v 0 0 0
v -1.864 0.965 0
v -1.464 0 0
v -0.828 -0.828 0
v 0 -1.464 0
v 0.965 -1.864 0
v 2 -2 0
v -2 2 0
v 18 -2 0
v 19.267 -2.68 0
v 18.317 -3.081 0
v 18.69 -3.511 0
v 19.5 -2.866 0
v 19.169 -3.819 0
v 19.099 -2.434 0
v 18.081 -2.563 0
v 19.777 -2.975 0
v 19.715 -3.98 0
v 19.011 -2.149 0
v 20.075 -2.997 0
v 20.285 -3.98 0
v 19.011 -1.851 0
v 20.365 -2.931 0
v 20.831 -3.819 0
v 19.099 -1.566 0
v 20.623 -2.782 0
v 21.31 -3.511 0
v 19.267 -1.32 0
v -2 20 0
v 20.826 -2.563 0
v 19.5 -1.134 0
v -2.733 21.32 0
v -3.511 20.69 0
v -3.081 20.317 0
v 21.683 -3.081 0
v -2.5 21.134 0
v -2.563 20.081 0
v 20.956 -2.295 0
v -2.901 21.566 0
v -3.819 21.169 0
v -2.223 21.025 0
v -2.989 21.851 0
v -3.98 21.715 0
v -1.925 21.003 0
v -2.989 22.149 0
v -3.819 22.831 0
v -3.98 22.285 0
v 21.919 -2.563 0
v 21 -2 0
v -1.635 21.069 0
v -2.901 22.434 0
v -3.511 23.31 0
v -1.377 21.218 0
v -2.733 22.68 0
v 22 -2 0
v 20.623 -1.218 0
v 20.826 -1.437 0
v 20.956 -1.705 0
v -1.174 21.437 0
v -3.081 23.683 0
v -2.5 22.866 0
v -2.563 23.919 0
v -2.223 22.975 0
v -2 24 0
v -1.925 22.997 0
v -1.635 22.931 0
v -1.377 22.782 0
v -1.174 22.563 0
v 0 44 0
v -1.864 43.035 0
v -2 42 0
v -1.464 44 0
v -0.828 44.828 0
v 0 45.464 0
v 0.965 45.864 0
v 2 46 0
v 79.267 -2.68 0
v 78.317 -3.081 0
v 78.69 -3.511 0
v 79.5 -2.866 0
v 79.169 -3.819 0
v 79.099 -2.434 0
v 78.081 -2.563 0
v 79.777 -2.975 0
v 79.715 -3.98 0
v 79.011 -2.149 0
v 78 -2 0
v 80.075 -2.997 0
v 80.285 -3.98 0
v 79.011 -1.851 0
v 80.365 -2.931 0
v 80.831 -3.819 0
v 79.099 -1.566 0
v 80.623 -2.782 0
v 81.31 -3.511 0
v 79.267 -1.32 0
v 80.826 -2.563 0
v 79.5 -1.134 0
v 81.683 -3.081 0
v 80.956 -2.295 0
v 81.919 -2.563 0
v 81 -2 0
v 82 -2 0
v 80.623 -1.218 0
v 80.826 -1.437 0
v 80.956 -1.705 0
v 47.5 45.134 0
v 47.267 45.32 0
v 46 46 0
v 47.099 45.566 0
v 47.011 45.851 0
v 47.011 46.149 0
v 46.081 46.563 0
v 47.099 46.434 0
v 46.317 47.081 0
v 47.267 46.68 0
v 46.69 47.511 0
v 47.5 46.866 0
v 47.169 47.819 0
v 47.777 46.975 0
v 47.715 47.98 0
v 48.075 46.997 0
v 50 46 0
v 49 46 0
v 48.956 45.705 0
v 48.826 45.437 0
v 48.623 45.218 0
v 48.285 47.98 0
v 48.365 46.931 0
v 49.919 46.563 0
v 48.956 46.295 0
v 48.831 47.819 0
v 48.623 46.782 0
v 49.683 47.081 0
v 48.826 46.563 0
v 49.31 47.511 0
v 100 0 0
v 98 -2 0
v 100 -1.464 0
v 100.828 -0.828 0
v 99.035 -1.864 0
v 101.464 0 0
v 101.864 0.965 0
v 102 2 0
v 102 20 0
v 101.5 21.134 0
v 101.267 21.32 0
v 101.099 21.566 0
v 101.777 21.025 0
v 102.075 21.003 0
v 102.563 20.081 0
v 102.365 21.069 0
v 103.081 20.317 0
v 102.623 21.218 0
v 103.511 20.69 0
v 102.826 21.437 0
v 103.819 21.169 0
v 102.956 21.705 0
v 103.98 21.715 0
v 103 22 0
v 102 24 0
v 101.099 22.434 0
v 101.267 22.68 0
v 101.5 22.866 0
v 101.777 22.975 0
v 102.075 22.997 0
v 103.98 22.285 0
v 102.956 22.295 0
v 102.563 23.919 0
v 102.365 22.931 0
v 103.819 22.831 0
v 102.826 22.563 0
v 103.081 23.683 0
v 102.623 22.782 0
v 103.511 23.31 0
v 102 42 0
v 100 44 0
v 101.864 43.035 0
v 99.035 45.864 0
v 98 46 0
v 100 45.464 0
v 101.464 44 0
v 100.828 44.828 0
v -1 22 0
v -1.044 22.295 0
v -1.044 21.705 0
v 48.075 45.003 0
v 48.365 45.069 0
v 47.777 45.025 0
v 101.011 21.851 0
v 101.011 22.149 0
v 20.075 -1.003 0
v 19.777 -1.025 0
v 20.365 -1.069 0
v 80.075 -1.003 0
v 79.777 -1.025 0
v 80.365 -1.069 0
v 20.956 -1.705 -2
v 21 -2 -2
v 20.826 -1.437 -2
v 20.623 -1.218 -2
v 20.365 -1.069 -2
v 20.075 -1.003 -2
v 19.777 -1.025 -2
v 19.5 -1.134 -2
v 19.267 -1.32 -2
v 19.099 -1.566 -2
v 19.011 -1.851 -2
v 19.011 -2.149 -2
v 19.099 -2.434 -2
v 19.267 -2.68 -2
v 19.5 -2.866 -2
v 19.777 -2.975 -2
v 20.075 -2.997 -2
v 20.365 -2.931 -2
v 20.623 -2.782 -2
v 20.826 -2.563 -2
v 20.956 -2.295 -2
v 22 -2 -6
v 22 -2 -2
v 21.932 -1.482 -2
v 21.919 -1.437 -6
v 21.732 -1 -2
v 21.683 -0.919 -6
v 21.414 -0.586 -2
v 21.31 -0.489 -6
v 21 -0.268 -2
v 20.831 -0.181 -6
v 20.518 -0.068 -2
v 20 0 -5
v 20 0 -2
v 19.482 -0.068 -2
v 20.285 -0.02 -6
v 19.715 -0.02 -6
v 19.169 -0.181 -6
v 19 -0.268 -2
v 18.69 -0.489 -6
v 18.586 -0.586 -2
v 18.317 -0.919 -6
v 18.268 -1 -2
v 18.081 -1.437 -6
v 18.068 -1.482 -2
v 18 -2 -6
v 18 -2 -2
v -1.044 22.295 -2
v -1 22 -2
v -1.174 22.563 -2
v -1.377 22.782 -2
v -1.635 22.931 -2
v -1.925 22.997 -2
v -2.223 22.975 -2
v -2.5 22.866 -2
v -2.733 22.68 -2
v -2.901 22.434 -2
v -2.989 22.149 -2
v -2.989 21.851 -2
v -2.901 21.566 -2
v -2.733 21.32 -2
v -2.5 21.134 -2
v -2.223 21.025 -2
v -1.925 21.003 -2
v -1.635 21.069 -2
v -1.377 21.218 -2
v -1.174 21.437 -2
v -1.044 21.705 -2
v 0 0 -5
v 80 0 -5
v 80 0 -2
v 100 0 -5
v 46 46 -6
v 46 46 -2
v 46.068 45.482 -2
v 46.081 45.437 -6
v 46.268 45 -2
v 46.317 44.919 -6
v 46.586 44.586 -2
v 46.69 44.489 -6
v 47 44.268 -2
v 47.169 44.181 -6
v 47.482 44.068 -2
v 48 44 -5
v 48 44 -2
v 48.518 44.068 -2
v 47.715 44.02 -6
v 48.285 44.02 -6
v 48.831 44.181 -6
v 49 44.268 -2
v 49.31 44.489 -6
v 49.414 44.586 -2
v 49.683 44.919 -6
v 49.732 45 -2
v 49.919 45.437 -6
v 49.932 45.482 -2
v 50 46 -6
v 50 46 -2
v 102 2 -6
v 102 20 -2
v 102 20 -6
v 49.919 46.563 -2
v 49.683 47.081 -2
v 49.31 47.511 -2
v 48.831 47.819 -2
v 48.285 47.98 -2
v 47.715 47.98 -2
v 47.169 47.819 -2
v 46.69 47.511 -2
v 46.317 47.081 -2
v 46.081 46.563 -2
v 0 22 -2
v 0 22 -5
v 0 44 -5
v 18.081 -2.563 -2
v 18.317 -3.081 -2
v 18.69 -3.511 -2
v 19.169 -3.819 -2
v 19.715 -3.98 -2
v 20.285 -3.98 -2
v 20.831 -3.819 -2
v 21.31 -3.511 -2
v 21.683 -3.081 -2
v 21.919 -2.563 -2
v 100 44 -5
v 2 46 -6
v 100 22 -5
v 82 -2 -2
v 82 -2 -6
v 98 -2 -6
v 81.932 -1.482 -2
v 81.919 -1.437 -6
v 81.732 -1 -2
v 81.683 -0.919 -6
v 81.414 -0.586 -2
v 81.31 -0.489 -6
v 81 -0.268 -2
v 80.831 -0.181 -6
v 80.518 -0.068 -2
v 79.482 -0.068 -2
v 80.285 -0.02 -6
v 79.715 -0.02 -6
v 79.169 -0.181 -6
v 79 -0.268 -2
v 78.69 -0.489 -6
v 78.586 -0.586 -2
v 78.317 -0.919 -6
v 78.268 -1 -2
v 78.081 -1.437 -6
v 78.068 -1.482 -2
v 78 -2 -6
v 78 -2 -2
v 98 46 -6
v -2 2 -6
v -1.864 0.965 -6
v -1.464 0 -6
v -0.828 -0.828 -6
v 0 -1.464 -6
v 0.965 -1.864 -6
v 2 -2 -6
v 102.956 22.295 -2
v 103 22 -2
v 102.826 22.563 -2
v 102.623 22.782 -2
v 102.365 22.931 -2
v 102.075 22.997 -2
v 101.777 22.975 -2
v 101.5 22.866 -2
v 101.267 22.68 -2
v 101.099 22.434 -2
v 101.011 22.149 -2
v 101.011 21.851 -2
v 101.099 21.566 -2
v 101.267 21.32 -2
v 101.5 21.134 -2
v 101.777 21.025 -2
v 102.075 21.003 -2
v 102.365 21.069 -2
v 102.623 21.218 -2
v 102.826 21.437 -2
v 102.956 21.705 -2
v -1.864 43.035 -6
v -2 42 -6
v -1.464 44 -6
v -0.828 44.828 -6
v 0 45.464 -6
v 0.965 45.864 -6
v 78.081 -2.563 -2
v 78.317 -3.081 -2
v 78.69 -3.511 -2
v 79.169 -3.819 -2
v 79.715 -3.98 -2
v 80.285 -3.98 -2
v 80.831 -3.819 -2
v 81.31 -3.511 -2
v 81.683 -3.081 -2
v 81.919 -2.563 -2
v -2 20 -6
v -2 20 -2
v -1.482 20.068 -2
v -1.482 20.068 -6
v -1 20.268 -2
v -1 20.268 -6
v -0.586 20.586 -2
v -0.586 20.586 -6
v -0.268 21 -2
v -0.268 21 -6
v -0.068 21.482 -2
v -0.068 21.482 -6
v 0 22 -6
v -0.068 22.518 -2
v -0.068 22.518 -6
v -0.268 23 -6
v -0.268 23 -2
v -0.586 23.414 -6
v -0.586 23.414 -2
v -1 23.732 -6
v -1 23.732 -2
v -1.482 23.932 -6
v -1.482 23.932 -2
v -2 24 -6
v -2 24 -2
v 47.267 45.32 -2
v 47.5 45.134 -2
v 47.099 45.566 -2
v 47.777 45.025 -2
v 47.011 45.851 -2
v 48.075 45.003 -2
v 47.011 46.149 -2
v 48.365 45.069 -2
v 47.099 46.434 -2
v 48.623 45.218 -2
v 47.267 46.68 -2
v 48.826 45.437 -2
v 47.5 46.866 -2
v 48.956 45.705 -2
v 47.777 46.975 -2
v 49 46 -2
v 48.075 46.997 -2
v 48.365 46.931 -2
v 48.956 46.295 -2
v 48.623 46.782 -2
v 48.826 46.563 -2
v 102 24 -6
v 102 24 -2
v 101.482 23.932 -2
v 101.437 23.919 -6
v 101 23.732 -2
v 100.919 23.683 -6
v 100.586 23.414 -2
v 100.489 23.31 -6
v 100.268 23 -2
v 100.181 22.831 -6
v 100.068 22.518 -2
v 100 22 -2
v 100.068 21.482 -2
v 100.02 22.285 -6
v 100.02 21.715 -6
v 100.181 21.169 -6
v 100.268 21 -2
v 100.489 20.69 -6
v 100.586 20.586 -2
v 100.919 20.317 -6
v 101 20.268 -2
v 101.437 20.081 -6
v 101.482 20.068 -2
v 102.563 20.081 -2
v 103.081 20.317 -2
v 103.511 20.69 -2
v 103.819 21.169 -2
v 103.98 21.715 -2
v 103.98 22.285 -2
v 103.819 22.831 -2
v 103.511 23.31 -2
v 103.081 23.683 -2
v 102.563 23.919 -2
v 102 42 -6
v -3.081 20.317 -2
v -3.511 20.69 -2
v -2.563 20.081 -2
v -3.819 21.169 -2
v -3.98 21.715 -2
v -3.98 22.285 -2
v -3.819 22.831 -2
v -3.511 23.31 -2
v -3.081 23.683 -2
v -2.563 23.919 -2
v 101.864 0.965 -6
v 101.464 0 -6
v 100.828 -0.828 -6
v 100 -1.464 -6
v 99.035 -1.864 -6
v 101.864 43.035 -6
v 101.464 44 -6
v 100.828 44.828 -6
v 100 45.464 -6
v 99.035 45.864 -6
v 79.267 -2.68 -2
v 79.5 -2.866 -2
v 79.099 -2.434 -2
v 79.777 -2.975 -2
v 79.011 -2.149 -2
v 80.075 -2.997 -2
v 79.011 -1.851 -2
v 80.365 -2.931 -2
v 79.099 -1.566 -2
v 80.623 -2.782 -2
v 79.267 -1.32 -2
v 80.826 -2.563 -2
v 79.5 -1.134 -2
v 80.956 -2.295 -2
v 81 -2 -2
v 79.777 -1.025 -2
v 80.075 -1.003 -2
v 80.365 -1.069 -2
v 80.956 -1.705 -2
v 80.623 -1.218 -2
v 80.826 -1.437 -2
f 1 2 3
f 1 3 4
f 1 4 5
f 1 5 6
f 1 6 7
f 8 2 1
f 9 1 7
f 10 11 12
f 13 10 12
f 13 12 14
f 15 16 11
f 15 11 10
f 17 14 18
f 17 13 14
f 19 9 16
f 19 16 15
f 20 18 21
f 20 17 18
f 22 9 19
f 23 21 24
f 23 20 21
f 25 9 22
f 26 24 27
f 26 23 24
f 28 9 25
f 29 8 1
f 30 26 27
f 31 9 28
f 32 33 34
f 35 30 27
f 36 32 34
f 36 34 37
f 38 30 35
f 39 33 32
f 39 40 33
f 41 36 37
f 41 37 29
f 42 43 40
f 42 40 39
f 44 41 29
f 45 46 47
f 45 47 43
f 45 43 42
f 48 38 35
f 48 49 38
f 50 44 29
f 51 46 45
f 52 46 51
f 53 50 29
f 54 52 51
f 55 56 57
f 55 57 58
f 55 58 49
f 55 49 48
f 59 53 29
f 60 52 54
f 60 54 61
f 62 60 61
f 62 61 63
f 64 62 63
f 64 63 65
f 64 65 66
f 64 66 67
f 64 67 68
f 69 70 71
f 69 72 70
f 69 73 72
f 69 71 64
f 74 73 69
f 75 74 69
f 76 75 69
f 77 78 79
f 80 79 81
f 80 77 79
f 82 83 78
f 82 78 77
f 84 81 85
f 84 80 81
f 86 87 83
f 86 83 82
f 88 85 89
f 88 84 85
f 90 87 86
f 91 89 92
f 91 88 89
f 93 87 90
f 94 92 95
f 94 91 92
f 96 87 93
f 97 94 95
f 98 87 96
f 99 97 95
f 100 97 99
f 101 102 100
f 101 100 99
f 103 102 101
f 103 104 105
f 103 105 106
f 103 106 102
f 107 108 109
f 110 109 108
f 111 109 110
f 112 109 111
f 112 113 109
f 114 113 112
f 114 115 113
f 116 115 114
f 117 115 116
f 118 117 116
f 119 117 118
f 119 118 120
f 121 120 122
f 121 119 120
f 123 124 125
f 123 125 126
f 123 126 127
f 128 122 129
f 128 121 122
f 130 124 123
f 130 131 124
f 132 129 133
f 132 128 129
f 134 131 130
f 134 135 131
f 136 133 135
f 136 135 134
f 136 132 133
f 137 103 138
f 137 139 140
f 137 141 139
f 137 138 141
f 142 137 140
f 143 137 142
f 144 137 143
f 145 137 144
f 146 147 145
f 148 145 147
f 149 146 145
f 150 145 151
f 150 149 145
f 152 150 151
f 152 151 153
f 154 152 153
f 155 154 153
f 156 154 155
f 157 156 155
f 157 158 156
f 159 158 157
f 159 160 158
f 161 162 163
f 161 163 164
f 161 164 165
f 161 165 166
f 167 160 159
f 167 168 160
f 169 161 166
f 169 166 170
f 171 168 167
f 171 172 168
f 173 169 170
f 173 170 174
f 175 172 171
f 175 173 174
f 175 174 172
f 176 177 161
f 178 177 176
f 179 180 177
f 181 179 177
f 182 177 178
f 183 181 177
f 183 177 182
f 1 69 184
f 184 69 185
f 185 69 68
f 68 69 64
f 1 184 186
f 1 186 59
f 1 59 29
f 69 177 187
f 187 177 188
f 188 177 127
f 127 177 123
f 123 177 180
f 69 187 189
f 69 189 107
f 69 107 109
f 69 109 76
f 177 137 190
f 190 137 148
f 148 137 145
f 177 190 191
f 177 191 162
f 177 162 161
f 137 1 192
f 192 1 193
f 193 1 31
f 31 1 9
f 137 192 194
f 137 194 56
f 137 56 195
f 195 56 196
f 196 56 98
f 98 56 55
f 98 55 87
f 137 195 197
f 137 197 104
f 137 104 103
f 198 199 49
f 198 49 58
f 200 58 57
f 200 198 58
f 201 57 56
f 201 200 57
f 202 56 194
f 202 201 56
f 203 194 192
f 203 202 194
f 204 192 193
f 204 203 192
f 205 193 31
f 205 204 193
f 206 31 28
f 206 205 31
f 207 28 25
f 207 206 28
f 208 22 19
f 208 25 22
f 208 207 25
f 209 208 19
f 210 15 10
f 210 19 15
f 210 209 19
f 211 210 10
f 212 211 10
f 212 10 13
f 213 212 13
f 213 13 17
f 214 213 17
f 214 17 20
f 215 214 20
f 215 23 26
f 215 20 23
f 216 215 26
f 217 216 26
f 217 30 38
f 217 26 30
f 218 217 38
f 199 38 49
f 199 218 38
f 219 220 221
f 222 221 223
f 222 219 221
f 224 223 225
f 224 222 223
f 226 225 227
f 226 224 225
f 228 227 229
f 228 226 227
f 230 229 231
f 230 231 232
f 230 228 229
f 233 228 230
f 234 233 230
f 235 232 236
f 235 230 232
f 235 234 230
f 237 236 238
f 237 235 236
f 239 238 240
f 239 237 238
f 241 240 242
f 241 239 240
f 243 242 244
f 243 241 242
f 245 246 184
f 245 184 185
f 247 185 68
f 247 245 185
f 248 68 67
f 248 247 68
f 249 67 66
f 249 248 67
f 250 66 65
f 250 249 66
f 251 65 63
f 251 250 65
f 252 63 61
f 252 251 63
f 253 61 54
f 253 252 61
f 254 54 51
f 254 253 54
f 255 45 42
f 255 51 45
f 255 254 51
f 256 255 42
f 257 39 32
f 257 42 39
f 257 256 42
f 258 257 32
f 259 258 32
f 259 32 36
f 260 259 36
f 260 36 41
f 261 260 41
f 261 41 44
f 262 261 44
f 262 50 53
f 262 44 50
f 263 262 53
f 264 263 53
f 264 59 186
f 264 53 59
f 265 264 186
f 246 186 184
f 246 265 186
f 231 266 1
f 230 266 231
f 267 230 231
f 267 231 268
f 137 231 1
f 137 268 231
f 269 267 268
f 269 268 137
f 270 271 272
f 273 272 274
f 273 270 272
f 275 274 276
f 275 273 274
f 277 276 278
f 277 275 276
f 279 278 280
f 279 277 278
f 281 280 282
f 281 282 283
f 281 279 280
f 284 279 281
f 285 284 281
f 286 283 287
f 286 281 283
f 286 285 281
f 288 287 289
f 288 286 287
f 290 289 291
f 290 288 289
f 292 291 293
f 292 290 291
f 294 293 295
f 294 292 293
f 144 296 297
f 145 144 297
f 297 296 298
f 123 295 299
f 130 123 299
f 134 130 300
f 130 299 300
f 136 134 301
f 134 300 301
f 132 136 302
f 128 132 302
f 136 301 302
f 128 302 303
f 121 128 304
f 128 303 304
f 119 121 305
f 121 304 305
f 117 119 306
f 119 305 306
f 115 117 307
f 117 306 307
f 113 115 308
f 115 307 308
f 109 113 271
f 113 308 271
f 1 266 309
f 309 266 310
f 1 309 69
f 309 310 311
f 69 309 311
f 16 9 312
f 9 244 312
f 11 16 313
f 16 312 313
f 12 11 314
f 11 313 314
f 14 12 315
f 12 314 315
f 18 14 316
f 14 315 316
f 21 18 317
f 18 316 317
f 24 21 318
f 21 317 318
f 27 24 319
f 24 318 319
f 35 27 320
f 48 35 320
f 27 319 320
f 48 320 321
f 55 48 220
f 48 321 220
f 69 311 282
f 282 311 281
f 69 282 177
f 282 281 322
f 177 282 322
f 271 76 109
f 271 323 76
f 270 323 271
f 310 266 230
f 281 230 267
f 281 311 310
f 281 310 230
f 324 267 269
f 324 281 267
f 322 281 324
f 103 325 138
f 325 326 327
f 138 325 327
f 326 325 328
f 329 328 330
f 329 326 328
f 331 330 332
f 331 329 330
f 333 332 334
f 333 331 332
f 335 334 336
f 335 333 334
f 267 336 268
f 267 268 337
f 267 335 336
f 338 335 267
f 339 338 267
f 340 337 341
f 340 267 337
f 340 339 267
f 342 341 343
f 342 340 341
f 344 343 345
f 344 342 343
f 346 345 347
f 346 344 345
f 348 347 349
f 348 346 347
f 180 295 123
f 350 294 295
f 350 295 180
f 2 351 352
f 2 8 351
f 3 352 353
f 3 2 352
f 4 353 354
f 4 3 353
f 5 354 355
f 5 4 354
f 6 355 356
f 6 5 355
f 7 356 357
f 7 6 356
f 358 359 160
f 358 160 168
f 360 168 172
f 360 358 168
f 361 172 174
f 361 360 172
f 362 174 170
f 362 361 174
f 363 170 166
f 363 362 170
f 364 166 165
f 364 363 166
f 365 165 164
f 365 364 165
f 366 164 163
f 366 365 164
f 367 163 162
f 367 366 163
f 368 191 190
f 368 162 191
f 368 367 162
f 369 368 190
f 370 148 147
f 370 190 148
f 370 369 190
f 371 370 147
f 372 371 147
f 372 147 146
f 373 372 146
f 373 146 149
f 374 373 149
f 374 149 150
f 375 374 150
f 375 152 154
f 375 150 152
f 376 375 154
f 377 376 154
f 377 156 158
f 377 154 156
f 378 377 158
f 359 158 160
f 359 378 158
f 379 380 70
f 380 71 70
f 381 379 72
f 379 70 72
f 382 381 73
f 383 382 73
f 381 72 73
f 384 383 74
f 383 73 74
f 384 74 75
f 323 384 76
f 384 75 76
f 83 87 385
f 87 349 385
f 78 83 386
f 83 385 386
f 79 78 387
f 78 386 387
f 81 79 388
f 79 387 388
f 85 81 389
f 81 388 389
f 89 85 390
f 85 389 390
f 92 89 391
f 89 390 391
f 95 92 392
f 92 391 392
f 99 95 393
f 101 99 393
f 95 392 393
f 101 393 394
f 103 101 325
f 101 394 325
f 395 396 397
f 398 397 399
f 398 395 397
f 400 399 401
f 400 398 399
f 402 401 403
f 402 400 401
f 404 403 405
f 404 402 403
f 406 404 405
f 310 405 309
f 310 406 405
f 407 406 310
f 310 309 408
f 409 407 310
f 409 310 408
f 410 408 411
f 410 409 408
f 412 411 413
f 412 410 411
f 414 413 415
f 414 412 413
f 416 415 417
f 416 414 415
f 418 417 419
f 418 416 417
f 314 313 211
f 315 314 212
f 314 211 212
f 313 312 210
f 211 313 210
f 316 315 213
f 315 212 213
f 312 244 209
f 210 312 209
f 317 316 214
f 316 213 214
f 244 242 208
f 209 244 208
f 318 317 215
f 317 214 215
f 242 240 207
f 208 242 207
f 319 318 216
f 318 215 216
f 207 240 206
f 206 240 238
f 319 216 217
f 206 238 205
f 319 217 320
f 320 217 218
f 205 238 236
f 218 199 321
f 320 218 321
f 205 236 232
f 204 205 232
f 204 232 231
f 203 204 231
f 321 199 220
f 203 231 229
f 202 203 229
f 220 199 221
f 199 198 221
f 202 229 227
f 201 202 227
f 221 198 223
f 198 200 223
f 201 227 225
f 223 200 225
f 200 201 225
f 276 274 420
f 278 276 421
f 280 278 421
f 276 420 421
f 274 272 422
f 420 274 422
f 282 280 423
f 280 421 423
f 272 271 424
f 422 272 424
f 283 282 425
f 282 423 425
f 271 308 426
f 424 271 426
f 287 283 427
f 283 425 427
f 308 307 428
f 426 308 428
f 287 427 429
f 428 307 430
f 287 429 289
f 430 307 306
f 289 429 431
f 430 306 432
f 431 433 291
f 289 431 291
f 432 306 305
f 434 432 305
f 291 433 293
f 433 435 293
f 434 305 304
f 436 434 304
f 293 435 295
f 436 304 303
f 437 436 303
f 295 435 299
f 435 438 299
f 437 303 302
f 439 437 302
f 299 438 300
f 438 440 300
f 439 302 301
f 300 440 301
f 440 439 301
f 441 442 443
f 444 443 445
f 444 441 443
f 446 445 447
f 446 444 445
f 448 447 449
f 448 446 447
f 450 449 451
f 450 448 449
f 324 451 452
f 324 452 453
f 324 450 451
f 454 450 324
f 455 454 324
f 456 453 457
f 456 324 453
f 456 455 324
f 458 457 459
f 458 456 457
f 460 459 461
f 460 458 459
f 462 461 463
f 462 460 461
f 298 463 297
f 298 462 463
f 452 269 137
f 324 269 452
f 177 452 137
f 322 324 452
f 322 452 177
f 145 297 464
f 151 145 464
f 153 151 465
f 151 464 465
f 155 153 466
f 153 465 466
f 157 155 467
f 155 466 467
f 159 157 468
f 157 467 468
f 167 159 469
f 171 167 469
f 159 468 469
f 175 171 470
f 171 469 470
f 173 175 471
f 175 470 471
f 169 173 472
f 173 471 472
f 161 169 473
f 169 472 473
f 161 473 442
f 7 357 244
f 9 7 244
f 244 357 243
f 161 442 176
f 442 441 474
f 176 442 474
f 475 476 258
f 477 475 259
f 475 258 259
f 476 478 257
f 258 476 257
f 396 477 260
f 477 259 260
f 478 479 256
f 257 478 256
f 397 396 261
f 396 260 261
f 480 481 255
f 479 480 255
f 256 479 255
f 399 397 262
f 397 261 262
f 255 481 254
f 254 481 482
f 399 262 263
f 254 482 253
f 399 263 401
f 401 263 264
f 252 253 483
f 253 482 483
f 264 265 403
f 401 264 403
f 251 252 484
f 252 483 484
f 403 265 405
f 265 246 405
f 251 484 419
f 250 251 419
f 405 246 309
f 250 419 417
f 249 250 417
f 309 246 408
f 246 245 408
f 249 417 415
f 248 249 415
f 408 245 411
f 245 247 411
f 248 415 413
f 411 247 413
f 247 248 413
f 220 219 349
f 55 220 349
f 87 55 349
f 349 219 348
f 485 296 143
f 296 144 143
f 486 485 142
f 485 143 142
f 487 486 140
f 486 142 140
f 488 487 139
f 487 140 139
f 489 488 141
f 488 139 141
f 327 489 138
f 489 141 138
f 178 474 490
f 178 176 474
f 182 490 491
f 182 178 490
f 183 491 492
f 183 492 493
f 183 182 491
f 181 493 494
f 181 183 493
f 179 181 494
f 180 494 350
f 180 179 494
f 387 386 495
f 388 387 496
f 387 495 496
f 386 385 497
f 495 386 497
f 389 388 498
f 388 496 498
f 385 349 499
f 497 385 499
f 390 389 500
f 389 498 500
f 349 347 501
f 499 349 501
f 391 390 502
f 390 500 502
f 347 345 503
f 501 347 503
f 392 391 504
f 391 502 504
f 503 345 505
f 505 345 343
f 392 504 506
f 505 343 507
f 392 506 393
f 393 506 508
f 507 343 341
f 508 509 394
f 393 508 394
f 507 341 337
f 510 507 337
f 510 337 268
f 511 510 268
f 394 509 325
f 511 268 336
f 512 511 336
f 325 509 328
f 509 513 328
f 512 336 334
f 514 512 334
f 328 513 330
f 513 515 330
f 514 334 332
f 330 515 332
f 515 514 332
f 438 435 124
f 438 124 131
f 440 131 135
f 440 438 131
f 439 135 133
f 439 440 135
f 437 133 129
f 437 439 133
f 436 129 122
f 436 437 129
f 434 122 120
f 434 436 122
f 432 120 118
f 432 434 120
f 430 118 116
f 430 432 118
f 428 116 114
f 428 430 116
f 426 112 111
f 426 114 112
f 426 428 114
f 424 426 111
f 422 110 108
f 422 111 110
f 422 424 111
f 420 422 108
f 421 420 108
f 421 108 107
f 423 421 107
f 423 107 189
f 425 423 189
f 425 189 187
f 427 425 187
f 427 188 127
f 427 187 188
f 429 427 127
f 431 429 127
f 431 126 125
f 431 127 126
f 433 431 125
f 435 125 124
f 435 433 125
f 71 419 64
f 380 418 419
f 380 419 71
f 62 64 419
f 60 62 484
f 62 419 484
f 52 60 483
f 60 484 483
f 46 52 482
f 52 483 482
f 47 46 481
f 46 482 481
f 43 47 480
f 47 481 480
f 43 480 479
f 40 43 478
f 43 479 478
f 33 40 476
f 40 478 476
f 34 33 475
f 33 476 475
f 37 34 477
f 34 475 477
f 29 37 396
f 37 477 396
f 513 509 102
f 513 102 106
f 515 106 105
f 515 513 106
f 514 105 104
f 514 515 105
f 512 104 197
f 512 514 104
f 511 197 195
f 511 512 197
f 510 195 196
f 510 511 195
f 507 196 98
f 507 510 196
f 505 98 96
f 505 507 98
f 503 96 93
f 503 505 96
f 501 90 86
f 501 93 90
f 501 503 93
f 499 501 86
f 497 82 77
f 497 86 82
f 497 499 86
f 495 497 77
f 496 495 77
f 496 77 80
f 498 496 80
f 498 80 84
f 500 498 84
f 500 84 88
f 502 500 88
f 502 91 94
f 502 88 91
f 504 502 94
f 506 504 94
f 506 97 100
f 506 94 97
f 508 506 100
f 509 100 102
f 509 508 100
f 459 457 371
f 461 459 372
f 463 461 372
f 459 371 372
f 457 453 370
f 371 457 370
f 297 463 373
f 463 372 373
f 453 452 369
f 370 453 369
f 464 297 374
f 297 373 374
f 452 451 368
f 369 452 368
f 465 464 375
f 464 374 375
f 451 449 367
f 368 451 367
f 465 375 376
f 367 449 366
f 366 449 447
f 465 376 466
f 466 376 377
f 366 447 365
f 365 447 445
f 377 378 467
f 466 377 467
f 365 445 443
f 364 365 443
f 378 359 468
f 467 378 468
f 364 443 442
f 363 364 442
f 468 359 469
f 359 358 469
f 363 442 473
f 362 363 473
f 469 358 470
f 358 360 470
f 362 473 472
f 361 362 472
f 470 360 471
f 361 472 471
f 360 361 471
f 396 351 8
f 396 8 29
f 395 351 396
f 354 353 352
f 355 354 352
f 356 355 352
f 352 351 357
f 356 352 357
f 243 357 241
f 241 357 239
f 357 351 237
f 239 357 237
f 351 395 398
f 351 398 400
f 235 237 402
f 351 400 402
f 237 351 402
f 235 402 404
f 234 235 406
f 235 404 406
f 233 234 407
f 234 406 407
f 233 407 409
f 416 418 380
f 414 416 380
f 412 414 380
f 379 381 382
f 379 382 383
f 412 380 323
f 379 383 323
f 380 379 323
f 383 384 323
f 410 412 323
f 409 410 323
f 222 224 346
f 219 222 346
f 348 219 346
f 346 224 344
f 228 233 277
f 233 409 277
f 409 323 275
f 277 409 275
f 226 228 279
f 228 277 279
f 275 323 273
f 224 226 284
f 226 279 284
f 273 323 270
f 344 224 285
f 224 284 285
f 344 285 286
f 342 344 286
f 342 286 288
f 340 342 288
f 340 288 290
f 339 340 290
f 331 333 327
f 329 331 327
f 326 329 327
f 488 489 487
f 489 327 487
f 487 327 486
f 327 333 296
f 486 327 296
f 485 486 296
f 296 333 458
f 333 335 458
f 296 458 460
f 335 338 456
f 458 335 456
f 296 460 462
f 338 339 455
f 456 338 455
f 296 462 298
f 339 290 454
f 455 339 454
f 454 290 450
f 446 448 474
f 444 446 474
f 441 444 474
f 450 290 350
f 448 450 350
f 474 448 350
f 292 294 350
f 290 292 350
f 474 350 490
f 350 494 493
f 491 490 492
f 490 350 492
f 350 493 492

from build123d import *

# Parameters (mm, degrees)
CYLINDER022_R     = 2
CYLINDER022_DEPTH = 6
CYLINDER024_R     = 2
CYLINDER024_DEPTH = 6
CYLINDER023_R     = 2
CYLINDER023_DEPTH = 6
CYLINDER020_R     = 2
CYLINDER020_DEPTH = 6
CYLINDER021_R     = 2
CYLINDER021_DEPTH = 6
CYLINDER014_R     = 1
CYLINDER014_DEPTH = 13
CYLINDER012_R     = 1
CYLINDER012_DEPTH = 13
CYLINDER013_R     = 1
CYLINDER013_DEPTH = 13
CYLINDER011_R     = 1
CYLINDER011_DEPTH = 13
CYLINDER010_R     = 1
CYLINDER010_DEPTH = 13
BOX012_W          = 10
BOX012_H          = 17
BOX012_DEPTH      = 8
BOX010_W          = 10
BOX010_H          = 17
BOX010_DEPTH      = 8
BOX013_W          = 10
BOX013_H          = 17
BOX013_DEPTH      = 8
BOX009_W          = 10
BOX009_H          = 17
BOX009_DEPTH      = 8
BOX008_W          = 10
BOX008_H          = 17
BOX008_DEPTH      = 8
BOX011_W          = 100
BOX011_H          = 44
BOX011_DEPTH      = 16.5
BOX007_W          = 104
BOX007_H          = 48
BOX007_DEPTH      = 6
FILLET001_R       = 4
CYLINDER019_R     = 2
CYLINDER019_DEPTH = 6
CYLINDER018_R     = 2
CYLINDER018_DEPTH = 6
CYLINDER017_R     = 2
CYLINDER017_DEPTH = 6
CYLINDER016_R     = 2
CYLINDER016_DEPTH = 6
CYLINDER015_R     = 2
CYLINDER015_DEPTH = 6


with BuildPart() as cylinder022:
    # Cylinder022 → Cylinder022 (new body)
    with BuildSketch(Plane(origin=(-2, 22, 0), x_dir=(1, 0, 0), z_dir=(0, 0, 1))):
        Circle(CYLINDER022_R)
    extrude(amount=CYLINDER022_DEPTH)


with BuildPart() as cylinder024:
    # Cylinder024 → Cylinder024 (new body)
    with BuildSketch(Plane(origin=(48, 46, 0), x_dir=(1, 0, 0), z_dir=(0, 0, 1))):
        Circle(CYLINDER024_R)
    extrude(amount=CYLINDER024_DEPTH)


with BuildPart() as cylinder023:
    # Cylinder023 → Cylinder023 (new body)
    with BuildSketch(Plane(origin=(102, 22, 0), x_dir=(1, 0, 0), z_dir=(0, 0, 1))):
        Circle(CYLINDER023_R)
    extrude(amount=CYLINDER023_DEPTH)


with BuildPart() as cylinder020:
    # Cylinder020 → Cylinder020 (new body)
    with BuildSketch(Plane(origin=(80, -2, 0), x_dir=(1, 0, 0), z_dir=(0, 0, 1))):
        Circle(CYLINDER020_R)
    extrude(amount=CYLINDER020_DEPTH)


with BuildPart() as fusion005:
    # Cylinder021 → Cylinder021 (new body)
    with BuildSketch(Plane(origin=(20, -2, 0), x_dir=(1, 0, 0), z_dir=(0, 0, 1))):
        Circle(CYLINDER021_R)
    extrude(amount=CYLINDER021_DEPTH)

    # Fusion005: union Cylinder022, Cylinder024, Cylinder023, Cylinder020
    add(cylinder022.part)
    add(cylinder024.part)
    add(cylinder023.part)
    add(cylinder020.part)


with BuildPart() as fusion005_1:
    # Fusion005 placement: moved
    add(fusion005.part.moved(Location((0, 0, -8))))


with BuildPart() as cylinder014:
    # Cylinder014 → Cylinder014 (new body)
    with BuildSketch(Plane(origin=(-2, 22, 0), x_dir=(1, 0, 0), z_dir=(0, 0, 1))):
        Circle(CYLINDER014_R)
    extrude(amount=CYLINDER014_DEPTH)


with BuildPart() as cylinder012:
    # Cylinder012 → Cylinder012 (new body)
    with BuildSketch(Plane(origin=(48, 46, 0), x_dir=(1, 0, 0), z_dir=(0, 0, 1))):
        Circle(CYLINDER012_R)
    extrude(amount=CYLINDER012_DEPTH)


with BuildPart() as cylinder013:
    # Cylinder013 → Cylinder013 (new body)
    with BuildSketch(Plane(origin=(102, 22, 0), x_dir=(1, 0, 0), z_dir=(0, 0, 1))):
        Circle(CYLINDER013_R)
    extrude(amount=CYLINDER013_DEPTH)


with BuildPart() as cylinder011:
    # Cylinder011 → Cylinder011 (new body)
    with BuildSketch(Plane(origin=(80, -2, 0), x_dir=(1, 0, 0), z_dir=(0, 0, 1))):
        Circle(CYLINDER011_R)
    extrude(amount=CYLINDER011_DEPTH)


with BuildPart() as fusion003:
    # Cylinder010 → Cylinder010 (new body)
    with BuildSketch(Plane(origin=(20, -2, 0), x_dir=(1, 0, 0), z_dir=(0, 0, 1))):
        Circle(CYLINDER010_R)
    extrude(amount=CYLINDER010_DEPTH)

    # Fusion003: union Cylinder014, Cylinder012, Cylinder013, Cylinder011
    add(cylinder014.part)
    add(cylinder012.part)
    add(cylinder013.part)
    add(cylinder011.part)


with BuildPart() as fusion003_1:
    # Fusion003 placement: moved
    add(fusion003.part.moved(Location((0, 0, -6))))


with BuildPart() as box012:
    # Box012 → Box012 (new body)
    with BuildSketch(Plane(origin=(1.6, 37, 0), x_dir=(1, 0, 0), z_dir=(0, 0, 1))):
        with Locations((5, 8.5)):
            Rectangle(BOX012_W, BOX012_H)
    extrude(amount=BOX012_DEPTH)


with BuildPart() as box010:
    # Box010 → Box010 (new body)
    with BuildSketch(Plane(origin=(13.8, 37, 0), x_dir=(1, 0, 0), z_dir=(0, 0, 1))):
        with Locations((5, 8.5)):
            Rectangle(BOX010_W, BOX010_H)
    extrude(amount=BOX010_DEPTH)


with BuildPart() as box013:
    # Box013 → Box013 (new body)
    with BuildSketch(Plane(origin=(25.8, 37, 0), x_dir=(1, 0, 0), z_dir=(0, 0, 1))):
        with Locations((5, 8.5)):
            Rectangle(BOX013_W, BOX013_H)
    extrude(amount=BOX013_DEPTH)


with BuildPart() as box009:
    # Box009 → Box009 (new body)
    with BuildSketch(Plane(origin=(58.8, 37, 0), x_dir=(1, 0, 0), z_dir=(0, 0, 1))):
        with Locations((5, 8.5)):
            Rectangle(BOX009_W, BOX009_H)
    extrude(amount=BOX009_DEPTH)


with BuildPart() as box008:
    # Box008 → Box008 (new body)
    with BuildSketch(Plane(origin=(93.8, 42, 0), x_dir=(0, -1, 0), z_dir=(0, 0, 1))):
        with Locations((5, 8.5)):
            Rectangle(BOX008_W, BOX008_H)
    extrude(amount=BOX008_DEPTH)


with BuildPart() as fusion001:
    # Box011 → Box011 (new body)
    with BuildSketch(Plane.XY.offset(-5)):
        with Locations((50, 22)):
            Rectangle(BOX011_W, BOX011_H)
    extrude(amount=BOX011_DEPTH)

    # Fusion001: union Box012, Box010, Box013, Box009, Box008
    add(box012.part)
    add(box010.part)
    add(box013.part)
    add(box009.part)
    add(box008.part)


with BuildPart() as fillet001:
    # Box007 → Box007 (new body)
    with BuildSketch(Plane(origin=(-2, -2, -6), x_dir=(1, 0, 0), z_dir=(0, 0, 1))):
        with Locations((52, 24)):
            Rectangle(BOX007_W, BOX007_H)
    extrude(amount=BOX007_DEPTH)

    # Cut001: cut Fusion001
    add(fusion001.part, mode=Mode.SUBTRACT)

    # Fillet001
    fillet001_edges = [fillet001.edges().sort_by_distance(p)[0] for p in [
        (-2, -2, -3),
        (-2, 46, -3),
        (102, -2, -3),
        (102, 46, -3),
    ]]
    fillet(fillet001_edges, radius=FILLET001_R)


with BuildPart() as cylinder019:
    # Cylinder019 → Cylinder019 (new body)
    with BuildSketch(Plane(origin=(-2, 22, 0), x_dir=(1, 0, 0), z_dir=(0, 0, 1))):
        Circle(CYLINDER019_R)
    extrude(amount=CYLINDER019_DEPTH)


with BuildPart() as cylinder018:
    # Cylinder018 → Cylinder018 (new body)
    with BuildSketch(Plane(origin=(48, 46, 0), x_dir=(1, 0, 0), z_dir=(0, 0, 1))):
        Circle(CYLINDER018_R)
    extrude(amount=CYLINDER018_DEPTH)


with BuildPart() as cylinder017:
    # Cylinder017 → Cylinder017 (new body)
    with BuildSketch(Plane(origin=(102, 22, 0), x_dir=(1, 0, 0), z_dir=(0, 0, 1))):
        Circle(CYLINDER017_R)
    extrude(amount=CYLINDER017_DEPTH)


with BuildPart() as cylinder016:
    # Cylinder016 → Cylinder016 (new body)
    with BuildSketch(Plane(origin=(80, -2, 0), x_dir=(1, 0, 0), z_dir=(0, 0, 1))):
        Circle(CYLINDER016_R)
    extrude(amount=CYLINDER016_DEPTH)


with BuildPart() as cut008:
    # Cylinder015 → Cylinder015 (new body)
    with BuildSketch(Plane(origin=(20, -2, 0), x_dir=(1, 0, 0), z_dir=(0, 0, 1))):
        Circle(CYLINDER015_R)
    extrude(amount=CYLINDER015_DEPTH)

    # Fusion004: union Cylinder019, Cylinder018, Cylinder017, Cylinder016
    add(cylinder019.part)
    add(cylinder018.part)
    add(cylinder017.part)
    add(cylinder016.part)


with BuildPart() as cut008_1:
    # Fusion004 placement: moved
    add(cut008.part.moved(Location((0, 0, -6))))

    # Fusion006: union Fillet001
    add(fillet001.part)

    # Cut007: cut Fusion003
    add(fusion003_1.part, mode=Mode.SUBTRACT)

    # Cut008: cut Fusion005
    add(fusion005_1.part, mode=Mode.SUBTRACT)


solid = cut008_1.part
